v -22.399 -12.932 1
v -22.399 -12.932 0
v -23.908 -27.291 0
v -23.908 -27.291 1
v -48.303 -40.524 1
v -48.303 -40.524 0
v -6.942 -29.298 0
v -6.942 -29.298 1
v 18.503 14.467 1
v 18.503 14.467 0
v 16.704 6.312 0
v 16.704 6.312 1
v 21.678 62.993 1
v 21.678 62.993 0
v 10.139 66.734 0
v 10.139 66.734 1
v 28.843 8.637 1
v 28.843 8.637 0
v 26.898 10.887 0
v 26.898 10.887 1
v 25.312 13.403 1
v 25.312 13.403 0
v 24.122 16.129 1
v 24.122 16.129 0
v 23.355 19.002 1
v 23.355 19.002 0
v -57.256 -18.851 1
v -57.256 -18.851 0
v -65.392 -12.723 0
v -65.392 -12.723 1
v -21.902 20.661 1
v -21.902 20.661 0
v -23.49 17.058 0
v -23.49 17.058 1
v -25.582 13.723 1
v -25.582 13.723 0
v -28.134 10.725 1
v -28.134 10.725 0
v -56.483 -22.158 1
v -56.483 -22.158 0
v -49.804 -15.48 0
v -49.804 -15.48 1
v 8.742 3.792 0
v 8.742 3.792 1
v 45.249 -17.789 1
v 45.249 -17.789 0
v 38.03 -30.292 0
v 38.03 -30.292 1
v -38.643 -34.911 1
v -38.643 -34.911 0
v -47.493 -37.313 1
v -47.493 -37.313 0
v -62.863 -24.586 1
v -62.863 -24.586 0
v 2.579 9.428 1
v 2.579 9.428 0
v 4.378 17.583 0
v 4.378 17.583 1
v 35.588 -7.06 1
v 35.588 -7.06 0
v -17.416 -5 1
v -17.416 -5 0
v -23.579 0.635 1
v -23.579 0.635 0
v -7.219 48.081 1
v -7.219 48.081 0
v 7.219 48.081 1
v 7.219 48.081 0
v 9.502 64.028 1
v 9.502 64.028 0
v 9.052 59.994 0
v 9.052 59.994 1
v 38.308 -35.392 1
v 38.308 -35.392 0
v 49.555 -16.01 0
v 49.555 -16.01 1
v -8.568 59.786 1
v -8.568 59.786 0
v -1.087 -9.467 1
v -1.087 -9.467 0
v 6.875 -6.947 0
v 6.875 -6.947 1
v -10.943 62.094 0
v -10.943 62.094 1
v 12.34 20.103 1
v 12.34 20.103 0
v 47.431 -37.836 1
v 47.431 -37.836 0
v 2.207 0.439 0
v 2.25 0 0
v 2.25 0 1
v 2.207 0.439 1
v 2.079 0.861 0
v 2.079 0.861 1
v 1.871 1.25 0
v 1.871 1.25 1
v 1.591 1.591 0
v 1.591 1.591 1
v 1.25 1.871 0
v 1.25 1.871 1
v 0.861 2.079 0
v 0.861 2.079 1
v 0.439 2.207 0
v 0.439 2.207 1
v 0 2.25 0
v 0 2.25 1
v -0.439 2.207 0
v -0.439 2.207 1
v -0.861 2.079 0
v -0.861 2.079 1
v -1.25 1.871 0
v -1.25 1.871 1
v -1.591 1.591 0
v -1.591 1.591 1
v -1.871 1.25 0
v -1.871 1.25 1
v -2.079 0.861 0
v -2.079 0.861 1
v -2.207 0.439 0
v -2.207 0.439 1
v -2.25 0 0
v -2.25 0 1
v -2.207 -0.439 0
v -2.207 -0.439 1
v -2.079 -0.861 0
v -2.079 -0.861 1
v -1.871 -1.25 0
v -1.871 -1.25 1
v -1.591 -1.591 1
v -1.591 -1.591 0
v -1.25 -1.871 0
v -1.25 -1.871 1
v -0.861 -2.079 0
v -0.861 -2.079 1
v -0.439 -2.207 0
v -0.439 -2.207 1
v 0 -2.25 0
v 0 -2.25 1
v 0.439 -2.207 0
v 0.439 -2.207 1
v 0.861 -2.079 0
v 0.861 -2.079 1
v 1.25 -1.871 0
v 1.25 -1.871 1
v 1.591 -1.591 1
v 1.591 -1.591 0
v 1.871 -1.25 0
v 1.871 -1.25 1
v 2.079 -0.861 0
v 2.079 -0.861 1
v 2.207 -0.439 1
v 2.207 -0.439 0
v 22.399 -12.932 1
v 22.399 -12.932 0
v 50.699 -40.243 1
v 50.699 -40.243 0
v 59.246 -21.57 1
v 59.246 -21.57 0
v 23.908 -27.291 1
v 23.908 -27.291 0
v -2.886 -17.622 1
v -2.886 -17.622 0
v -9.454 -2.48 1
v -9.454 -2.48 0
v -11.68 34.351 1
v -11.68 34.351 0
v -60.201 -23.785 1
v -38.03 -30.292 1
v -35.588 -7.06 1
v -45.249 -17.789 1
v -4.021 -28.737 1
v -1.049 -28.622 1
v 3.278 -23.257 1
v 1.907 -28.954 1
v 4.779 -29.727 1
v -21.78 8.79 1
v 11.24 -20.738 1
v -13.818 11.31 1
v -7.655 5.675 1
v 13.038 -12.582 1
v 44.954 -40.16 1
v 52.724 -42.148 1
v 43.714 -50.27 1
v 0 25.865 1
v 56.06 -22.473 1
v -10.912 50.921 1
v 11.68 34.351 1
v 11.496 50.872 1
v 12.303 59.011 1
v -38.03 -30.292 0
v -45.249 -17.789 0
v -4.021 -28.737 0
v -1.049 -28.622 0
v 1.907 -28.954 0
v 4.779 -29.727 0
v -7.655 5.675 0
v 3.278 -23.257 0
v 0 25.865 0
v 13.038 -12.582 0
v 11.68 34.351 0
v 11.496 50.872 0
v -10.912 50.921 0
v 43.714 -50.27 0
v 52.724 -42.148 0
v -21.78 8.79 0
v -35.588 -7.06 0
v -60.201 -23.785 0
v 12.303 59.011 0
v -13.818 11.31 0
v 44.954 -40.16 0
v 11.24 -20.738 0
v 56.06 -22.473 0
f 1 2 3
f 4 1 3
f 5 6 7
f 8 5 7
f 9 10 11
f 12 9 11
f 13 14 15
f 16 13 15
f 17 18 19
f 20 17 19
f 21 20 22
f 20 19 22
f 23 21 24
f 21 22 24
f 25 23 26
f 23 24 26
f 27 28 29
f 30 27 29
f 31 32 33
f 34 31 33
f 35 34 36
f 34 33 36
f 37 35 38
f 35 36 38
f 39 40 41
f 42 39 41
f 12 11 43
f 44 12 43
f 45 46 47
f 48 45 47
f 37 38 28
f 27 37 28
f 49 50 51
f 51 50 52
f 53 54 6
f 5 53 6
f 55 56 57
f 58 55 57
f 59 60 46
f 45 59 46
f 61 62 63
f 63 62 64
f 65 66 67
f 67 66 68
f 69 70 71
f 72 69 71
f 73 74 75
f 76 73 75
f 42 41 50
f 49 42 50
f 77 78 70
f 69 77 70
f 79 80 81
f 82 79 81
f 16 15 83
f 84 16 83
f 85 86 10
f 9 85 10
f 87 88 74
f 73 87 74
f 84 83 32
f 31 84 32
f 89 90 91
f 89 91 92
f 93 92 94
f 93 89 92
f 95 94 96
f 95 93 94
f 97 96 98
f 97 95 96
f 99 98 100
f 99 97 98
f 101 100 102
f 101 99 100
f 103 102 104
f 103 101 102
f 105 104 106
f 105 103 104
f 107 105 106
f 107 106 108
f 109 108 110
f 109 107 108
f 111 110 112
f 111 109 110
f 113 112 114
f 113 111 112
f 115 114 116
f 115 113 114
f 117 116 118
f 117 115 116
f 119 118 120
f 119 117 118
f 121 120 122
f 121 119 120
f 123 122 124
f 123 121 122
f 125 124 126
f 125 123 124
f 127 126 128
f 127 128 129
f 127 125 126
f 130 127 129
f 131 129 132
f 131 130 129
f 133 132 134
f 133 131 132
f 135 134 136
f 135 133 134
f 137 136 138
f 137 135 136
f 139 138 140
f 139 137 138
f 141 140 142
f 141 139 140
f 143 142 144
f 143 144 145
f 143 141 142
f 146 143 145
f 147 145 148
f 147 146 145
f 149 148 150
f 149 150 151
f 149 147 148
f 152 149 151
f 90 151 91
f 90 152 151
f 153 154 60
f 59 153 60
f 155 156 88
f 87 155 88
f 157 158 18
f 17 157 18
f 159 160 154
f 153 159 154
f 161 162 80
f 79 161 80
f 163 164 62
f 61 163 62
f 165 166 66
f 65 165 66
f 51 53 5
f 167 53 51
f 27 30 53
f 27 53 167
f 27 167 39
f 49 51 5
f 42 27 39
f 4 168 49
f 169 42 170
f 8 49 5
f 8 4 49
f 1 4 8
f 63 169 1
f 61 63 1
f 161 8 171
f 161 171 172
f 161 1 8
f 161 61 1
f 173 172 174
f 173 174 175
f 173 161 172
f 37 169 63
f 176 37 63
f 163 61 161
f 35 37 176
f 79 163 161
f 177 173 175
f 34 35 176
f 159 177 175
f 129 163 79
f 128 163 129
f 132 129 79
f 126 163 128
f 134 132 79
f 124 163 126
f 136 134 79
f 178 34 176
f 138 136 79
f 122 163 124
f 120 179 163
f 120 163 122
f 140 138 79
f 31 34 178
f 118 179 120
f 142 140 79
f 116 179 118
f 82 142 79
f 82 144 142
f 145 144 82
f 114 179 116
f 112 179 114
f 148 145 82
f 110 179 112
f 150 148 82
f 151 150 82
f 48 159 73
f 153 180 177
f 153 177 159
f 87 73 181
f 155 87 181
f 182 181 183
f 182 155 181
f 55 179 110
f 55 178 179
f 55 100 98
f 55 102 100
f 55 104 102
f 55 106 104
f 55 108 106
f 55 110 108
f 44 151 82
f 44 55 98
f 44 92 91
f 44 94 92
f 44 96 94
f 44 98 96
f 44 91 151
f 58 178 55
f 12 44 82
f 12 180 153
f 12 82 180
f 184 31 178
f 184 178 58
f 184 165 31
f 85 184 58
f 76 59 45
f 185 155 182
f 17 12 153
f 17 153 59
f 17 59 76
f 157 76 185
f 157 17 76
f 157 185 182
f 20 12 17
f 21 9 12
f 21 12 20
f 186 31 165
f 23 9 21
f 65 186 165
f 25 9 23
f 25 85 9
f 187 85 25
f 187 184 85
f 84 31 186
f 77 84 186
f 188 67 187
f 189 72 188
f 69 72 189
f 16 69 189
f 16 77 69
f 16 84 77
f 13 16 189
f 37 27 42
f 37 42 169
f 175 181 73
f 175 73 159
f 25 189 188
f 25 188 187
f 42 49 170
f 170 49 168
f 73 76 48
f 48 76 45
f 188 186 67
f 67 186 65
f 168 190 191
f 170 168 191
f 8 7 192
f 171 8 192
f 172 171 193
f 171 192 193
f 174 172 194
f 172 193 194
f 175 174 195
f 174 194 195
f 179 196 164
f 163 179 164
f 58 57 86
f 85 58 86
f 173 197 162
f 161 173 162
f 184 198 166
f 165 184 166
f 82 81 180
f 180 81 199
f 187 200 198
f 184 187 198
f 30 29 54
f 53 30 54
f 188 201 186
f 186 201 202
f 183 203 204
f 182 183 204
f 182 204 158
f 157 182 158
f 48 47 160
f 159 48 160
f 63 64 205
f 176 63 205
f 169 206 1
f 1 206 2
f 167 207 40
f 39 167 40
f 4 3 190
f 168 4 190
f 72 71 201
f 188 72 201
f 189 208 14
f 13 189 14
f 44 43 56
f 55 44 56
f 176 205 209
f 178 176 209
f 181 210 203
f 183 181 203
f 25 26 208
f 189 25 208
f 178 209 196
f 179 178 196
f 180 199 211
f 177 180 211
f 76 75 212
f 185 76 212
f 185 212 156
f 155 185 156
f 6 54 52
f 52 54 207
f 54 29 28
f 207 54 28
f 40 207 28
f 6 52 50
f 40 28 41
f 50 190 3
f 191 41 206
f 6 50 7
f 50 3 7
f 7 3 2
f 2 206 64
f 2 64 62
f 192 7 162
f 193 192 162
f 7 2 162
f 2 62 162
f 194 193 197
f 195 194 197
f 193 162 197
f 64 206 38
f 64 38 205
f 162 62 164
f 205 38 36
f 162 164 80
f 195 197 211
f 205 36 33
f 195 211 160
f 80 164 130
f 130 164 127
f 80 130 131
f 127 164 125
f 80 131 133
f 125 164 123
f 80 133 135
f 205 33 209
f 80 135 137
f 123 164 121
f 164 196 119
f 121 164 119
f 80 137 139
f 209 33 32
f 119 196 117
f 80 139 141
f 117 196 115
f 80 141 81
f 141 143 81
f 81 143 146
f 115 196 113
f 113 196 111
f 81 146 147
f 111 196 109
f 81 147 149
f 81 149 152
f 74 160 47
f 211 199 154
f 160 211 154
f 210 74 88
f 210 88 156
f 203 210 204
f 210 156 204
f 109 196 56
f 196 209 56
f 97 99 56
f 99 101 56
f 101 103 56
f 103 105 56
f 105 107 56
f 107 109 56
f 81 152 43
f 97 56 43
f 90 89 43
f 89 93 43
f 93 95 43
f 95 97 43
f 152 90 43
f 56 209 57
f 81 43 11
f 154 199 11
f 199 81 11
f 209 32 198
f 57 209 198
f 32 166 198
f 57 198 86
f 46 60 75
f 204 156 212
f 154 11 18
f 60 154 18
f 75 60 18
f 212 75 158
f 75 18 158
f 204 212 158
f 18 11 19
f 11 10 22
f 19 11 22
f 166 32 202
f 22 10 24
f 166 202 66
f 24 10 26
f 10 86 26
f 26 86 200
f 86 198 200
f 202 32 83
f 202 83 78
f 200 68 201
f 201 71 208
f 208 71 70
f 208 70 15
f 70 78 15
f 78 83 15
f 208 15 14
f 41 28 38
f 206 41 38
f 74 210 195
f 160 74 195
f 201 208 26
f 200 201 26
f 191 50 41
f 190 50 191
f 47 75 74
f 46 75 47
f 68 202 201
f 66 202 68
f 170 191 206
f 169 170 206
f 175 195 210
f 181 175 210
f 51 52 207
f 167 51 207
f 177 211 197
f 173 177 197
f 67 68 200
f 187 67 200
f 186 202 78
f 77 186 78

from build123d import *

# Parameters (mm, degrees)
F0_R     = 2.25
F1_DEPTH = 1


with BuildPart() as f1:
    # F0 (on Top) → F1 (new body)
    with BuildSketch(Plane.XY):
        with BuildLine():
            Line((21.677962, 62.992528), (10.139461, 66.734109))
            Line((10.139461, 66.734109), (-10.943207, 62.093519))
            Line((-10.943207, 62.093519), (-21.901843, 20.660526))
            ThreePointArc((-21.901843, 20.660526), (-24.475691, 15.352547), (-28.134067, 10.724846))
            Line((-28.134067, 10.724846), (-57.256493, -18.85125))
            Line((-57.256493, -18.85125), (-65.39211, -12.722599))
            Line((-65.39211, -12.722599), (-62.863164, -24.586024))
            Line((-62.863164, -24.586024), (-48.302961, -40.523855))
            Line((-48.302961, -40.523855), (-6.941619, -29.297815))
            ThreePointArc((-6.941619, -29.297815), (-1.048655, -28.621876), (4.779045, -29.72724))
            Line((4.779045, -29.72724), (44.953908, -40.159952))
            Line((44.953908, -40.159952), (43.714149, -50.269929))
            Line((43.714149, -50.269929), (52.723703, -42.148085))
            Line((52.723703, -42.148085), (59.246168, -21.569664))
            Line((59.246168, -21.569664), (28.843462, 8.637289))
            ThreePointArc((28.843462, 8.637289), (25.3116, 13.402776), (23.355023, 19.002394))
            Line((23.355023, 19.002394), (12.302585, 59.011202))
            Line((12.302585, 59.011202), (21.677962, 62.992528))
        make_face()
        Polygon((-47.492523, -37.312847), (-60.201257, -23.785029), (-56.482609, -22.158133), (-49.804259, -15.479784), (-38.642525, -34.910835), align=None, mode=Mode.SUBTRACT)
        Polygon((-22.399317, -12.932252), (-23.90843, -27.290503), (-38.03028, -30.292195), (-45.24895, -17.789091), (-35.588484, -7.060056), align=None, mode=Mode.SUBTRACT)
        Polygon((-21.780303, 8.790208), (-13.818382, 11.310016), (-7.655204, 5.674693), (-9.453948, -2.480436), (-17.415869, -5.000244), (-23.579047, 0.635079), align=None, mode=Mode.SUBTRACT)
        Polygon((47.430811, -37.836308), (38.308016, -35.391861), (49.554932, -16.009991), (56.060134, -22.473308), (50.699068, -40.243304), align=None, mode=Mode.SUBTRACT)
        Polygon((3.277608, -23.2574), (-2.88557, -17.622078), (-1.086826, -9.466948), (6.875095, -6.947141), (13.038273, -12.582463), (11.239529, -20.737593), align=None, mode=Mode.SUBTRACT)
        Circle(F0_R, mode=Mode.SUBTRACT)
        Polygon((22.399317, -12.932252), (35.588484, -7.060056), (45.24895, -17.789091), (38.03028, -30.292195), (23.90843, -27.290503), align=None, mode=Mode.SUBTRACT)
        Polygon((18.502695, 14.467192), (16.703952, 6.312062), (8.742031, 3.792255), (2.578853, 9.427577), (4.377597, 17.582707), (12.339518, 20.102514), align=None, mode=Mode.SUBTRACT)
        Polygon((-11.680054, 34.350559), (-7.21867, 48.081286), (7.21867, 48.081286), (11.680054, 34.350559), (0, 25.864504), align=None, mode=Mode.SUBTRACT)
        Polygon((9.051799, 59.994441), (11.496243, 50.871646), (-10.912408, 50.920826), (-8.567612, 59.786155), (9.50219, 64.028333), align=None, mode=Mode.SUBTRACT)
    extrude(amount=F1_DEPTH)


solid = f1.part
